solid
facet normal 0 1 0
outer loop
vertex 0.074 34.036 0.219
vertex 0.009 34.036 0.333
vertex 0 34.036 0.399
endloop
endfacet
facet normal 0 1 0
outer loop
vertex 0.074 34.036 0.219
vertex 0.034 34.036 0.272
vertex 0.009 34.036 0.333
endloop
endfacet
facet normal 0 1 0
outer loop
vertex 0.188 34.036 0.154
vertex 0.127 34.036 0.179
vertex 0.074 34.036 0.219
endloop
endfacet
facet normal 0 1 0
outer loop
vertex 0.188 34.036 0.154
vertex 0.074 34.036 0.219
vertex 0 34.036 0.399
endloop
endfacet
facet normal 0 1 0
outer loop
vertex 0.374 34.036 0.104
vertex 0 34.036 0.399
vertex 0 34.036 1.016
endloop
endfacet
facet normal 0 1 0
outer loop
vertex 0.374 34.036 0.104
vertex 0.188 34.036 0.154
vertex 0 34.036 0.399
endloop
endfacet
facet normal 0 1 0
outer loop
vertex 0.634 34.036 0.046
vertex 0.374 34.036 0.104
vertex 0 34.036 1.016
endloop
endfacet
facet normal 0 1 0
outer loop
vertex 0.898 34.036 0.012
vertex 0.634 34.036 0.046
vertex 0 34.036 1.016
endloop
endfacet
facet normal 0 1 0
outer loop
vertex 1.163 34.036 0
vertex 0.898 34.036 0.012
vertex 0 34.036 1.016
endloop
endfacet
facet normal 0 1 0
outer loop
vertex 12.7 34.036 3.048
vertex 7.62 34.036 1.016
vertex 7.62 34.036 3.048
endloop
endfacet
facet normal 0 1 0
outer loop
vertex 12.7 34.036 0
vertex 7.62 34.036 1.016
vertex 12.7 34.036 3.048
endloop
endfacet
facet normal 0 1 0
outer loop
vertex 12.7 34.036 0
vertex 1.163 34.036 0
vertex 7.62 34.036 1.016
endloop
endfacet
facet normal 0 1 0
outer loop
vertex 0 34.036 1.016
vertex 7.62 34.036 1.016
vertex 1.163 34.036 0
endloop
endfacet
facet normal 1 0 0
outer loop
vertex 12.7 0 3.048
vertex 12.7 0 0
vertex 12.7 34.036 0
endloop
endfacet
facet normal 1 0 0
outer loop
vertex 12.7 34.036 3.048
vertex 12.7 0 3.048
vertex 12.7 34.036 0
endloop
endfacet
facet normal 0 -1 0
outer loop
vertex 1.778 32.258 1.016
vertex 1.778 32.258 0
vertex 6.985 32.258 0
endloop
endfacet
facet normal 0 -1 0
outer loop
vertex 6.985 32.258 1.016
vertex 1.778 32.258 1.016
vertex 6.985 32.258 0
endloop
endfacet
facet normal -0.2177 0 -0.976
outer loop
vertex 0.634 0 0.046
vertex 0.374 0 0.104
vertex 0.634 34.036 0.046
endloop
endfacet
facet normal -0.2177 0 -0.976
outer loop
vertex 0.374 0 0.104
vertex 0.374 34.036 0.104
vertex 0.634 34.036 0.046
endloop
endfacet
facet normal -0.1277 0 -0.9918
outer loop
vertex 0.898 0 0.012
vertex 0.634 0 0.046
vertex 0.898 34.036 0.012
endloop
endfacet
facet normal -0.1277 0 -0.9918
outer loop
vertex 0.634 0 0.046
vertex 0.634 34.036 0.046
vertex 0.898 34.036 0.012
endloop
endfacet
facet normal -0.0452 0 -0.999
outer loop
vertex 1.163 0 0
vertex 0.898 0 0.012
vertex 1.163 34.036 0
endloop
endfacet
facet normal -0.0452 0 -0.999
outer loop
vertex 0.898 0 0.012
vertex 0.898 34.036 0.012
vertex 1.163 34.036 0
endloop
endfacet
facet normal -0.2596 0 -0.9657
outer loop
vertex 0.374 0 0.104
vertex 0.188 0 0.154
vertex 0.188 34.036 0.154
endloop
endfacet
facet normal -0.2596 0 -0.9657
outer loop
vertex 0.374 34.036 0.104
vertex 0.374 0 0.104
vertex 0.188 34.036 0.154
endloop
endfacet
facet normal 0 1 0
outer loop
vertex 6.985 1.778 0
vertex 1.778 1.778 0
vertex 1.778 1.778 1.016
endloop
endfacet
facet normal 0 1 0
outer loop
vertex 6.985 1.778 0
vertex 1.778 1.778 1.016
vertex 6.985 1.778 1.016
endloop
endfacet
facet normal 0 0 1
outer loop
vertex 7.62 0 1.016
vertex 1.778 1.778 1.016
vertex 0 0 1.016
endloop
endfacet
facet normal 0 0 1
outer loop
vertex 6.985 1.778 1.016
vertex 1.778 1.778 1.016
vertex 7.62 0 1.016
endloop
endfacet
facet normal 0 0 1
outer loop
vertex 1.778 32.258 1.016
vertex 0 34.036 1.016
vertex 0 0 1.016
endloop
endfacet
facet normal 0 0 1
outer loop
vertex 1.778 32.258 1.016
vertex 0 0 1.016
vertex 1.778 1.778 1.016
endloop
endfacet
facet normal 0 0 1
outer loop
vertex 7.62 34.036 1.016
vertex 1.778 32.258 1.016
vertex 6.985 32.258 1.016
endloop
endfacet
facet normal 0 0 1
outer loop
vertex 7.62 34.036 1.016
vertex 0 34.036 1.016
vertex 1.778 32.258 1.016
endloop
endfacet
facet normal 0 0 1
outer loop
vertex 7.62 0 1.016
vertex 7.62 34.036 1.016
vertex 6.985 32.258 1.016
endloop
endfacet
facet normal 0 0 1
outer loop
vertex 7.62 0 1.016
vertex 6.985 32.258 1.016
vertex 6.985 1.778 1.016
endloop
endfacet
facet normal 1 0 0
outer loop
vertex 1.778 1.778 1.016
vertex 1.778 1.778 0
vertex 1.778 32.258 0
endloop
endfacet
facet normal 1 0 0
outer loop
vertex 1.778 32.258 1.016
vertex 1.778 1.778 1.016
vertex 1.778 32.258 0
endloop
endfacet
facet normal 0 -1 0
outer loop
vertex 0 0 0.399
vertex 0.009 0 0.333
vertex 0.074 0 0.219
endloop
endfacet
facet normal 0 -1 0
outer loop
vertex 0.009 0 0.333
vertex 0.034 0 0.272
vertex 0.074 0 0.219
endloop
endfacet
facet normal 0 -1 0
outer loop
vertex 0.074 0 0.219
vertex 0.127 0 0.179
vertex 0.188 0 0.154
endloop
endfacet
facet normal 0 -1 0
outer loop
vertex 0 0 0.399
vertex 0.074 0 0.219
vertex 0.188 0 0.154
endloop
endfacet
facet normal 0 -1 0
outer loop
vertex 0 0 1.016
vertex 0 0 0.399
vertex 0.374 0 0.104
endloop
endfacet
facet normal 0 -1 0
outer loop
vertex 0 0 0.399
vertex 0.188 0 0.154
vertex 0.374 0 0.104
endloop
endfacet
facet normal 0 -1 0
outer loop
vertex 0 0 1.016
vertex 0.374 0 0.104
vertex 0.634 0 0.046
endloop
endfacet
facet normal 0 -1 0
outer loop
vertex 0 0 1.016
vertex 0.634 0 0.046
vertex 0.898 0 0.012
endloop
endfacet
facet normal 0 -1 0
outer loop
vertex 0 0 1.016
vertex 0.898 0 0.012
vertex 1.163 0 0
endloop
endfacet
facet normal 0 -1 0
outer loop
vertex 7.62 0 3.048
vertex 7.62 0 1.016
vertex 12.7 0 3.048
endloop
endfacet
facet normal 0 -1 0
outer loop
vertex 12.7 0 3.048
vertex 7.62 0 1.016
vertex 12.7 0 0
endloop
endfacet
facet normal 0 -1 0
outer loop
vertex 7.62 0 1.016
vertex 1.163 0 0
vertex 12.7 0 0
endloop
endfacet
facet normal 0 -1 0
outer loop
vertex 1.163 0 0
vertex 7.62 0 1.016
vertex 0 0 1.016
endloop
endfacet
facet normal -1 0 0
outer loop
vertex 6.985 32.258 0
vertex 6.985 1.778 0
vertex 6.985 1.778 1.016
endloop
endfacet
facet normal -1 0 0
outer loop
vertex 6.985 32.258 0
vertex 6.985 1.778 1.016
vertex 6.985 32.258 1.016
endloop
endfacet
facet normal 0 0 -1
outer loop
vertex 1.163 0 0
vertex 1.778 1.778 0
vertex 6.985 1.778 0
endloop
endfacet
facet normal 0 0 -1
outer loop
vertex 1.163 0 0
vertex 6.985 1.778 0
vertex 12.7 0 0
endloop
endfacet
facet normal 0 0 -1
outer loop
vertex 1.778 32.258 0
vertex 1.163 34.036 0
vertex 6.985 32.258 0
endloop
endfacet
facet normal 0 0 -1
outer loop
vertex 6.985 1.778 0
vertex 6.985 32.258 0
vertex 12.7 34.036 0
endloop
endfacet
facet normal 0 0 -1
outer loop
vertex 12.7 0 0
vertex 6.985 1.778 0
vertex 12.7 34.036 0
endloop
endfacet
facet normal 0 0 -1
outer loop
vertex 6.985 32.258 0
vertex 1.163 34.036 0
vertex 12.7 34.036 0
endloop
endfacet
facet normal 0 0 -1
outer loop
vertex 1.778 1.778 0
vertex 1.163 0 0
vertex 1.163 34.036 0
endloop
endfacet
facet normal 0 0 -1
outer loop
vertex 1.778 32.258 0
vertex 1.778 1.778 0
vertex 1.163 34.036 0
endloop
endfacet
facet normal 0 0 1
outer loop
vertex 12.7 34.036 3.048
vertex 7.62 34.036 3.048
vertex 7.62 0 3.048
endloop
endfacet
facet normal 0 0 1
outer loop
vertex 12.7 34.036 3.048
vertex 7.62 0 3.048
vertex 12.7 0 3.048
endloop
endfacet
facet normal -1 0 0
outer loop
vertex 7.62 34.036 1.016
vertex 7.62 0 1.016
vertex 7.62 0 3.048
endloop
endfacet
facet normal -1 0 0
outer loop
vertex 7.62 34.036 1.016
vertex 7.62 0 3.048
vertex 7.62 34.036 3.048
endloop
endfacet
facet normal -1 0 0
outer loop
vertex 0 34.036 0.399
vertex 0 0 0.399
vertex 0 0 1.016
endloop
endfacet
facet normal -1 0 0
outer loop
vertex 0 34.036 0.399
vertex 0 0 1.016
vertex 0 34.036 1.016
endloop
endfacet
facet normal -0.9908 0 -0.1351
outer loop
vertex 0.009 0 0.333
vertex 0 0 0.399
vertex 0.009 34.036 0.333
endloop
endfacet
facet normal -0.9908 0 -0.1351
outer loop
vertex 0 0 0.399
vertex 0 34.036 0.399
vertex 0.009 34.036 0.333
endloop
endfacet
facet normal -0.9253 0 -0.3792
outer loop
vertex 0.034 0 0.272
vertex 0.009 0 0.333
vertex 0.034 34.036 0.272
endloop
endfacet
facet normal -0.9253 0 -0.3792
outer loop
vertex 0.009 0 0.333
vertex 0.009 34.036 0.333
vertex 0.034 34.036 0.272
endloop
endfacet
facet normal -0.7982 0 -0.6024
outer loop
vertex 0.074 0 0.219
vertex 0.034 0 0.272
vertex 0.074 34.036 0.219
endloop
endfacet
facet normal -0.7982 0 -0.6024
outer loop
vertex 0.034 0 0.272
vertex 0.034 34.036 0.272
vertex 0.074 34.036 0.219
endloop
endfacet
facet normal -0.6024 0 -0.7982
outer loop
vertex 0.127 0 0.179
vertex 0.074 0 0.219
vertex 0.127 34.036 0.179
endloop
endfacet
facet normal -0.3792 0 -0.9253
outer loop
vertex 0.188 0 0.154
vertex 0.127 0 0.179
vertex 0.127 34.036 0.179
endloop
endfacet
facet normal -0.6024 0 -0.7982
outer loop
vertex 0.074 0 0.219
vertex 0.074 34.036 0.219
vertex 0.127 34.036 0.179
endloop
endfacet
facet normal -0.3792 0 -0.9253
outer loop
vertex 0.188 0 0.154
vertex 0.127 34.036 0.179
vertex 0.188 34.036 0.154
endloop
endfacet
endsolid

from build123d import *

# Parameters (mm, degrees)
F0_W     = 7.62
F0_H     = 34.036
F0_W_2   = 5.207
F0_H_2   = 30.48
F1_DEPTH = 1.016
F2_SIZE2 = 0.2041772846
F2_SIZE  = 0.762
F3_R     = 0.254
F4_R     = 3.048
F5_W     = 5.08
F5_H     = 34.036
F6_DEPTH = 3.048


with BuildPart() as f1:
    # F0 (on Top) → F1 (new body)
    with BuildSketch(Plane.XY):
        with Locations((3.81, 17.018)):
            Rectangle(F0_W, F0_H)
        with Locations((4.3815, 17.018)):
            Rectangle(F0_W_2, F0_H_2, mode=Mode.SUBTRACT)
    extrude(amount=F1_DEPTH)

    # F2
    f2_edges = [f1.edges().sort_by_distance(p)[0] for p in [
        (0, 17.018, 0),
    ]]
    f2_side = f1.faces().sort_by_distance((0.348786, 17.018, 0))[0]
    chamfer(f2_edges, length=F2_SIZE, length2=F2_SIZE2, reference=f2_side)

    # F3
    f3_edges = [f1.edges().sort_by_distance(p)[0] for p in [
        (0, 17.018, 0.204177),
    ]]
    fillet(f3_edges, radius=F3_R)

    # F4
    f4_edges = [f1.edges().sort_by_distance(p)[0] for p in [
        (0.762, 17.018, 0),
    ]]
    fillet(f4_edges, radius=F4_R)

    # F5 (on Top) → F6 (join)
    with BuildSketch(Plane.XY):
        with Locations((10.16, 17.018)):
            Rectangle(F5_W, F5_H)
    extrude(amount=F6_DEPTH)


solid = f1.part
